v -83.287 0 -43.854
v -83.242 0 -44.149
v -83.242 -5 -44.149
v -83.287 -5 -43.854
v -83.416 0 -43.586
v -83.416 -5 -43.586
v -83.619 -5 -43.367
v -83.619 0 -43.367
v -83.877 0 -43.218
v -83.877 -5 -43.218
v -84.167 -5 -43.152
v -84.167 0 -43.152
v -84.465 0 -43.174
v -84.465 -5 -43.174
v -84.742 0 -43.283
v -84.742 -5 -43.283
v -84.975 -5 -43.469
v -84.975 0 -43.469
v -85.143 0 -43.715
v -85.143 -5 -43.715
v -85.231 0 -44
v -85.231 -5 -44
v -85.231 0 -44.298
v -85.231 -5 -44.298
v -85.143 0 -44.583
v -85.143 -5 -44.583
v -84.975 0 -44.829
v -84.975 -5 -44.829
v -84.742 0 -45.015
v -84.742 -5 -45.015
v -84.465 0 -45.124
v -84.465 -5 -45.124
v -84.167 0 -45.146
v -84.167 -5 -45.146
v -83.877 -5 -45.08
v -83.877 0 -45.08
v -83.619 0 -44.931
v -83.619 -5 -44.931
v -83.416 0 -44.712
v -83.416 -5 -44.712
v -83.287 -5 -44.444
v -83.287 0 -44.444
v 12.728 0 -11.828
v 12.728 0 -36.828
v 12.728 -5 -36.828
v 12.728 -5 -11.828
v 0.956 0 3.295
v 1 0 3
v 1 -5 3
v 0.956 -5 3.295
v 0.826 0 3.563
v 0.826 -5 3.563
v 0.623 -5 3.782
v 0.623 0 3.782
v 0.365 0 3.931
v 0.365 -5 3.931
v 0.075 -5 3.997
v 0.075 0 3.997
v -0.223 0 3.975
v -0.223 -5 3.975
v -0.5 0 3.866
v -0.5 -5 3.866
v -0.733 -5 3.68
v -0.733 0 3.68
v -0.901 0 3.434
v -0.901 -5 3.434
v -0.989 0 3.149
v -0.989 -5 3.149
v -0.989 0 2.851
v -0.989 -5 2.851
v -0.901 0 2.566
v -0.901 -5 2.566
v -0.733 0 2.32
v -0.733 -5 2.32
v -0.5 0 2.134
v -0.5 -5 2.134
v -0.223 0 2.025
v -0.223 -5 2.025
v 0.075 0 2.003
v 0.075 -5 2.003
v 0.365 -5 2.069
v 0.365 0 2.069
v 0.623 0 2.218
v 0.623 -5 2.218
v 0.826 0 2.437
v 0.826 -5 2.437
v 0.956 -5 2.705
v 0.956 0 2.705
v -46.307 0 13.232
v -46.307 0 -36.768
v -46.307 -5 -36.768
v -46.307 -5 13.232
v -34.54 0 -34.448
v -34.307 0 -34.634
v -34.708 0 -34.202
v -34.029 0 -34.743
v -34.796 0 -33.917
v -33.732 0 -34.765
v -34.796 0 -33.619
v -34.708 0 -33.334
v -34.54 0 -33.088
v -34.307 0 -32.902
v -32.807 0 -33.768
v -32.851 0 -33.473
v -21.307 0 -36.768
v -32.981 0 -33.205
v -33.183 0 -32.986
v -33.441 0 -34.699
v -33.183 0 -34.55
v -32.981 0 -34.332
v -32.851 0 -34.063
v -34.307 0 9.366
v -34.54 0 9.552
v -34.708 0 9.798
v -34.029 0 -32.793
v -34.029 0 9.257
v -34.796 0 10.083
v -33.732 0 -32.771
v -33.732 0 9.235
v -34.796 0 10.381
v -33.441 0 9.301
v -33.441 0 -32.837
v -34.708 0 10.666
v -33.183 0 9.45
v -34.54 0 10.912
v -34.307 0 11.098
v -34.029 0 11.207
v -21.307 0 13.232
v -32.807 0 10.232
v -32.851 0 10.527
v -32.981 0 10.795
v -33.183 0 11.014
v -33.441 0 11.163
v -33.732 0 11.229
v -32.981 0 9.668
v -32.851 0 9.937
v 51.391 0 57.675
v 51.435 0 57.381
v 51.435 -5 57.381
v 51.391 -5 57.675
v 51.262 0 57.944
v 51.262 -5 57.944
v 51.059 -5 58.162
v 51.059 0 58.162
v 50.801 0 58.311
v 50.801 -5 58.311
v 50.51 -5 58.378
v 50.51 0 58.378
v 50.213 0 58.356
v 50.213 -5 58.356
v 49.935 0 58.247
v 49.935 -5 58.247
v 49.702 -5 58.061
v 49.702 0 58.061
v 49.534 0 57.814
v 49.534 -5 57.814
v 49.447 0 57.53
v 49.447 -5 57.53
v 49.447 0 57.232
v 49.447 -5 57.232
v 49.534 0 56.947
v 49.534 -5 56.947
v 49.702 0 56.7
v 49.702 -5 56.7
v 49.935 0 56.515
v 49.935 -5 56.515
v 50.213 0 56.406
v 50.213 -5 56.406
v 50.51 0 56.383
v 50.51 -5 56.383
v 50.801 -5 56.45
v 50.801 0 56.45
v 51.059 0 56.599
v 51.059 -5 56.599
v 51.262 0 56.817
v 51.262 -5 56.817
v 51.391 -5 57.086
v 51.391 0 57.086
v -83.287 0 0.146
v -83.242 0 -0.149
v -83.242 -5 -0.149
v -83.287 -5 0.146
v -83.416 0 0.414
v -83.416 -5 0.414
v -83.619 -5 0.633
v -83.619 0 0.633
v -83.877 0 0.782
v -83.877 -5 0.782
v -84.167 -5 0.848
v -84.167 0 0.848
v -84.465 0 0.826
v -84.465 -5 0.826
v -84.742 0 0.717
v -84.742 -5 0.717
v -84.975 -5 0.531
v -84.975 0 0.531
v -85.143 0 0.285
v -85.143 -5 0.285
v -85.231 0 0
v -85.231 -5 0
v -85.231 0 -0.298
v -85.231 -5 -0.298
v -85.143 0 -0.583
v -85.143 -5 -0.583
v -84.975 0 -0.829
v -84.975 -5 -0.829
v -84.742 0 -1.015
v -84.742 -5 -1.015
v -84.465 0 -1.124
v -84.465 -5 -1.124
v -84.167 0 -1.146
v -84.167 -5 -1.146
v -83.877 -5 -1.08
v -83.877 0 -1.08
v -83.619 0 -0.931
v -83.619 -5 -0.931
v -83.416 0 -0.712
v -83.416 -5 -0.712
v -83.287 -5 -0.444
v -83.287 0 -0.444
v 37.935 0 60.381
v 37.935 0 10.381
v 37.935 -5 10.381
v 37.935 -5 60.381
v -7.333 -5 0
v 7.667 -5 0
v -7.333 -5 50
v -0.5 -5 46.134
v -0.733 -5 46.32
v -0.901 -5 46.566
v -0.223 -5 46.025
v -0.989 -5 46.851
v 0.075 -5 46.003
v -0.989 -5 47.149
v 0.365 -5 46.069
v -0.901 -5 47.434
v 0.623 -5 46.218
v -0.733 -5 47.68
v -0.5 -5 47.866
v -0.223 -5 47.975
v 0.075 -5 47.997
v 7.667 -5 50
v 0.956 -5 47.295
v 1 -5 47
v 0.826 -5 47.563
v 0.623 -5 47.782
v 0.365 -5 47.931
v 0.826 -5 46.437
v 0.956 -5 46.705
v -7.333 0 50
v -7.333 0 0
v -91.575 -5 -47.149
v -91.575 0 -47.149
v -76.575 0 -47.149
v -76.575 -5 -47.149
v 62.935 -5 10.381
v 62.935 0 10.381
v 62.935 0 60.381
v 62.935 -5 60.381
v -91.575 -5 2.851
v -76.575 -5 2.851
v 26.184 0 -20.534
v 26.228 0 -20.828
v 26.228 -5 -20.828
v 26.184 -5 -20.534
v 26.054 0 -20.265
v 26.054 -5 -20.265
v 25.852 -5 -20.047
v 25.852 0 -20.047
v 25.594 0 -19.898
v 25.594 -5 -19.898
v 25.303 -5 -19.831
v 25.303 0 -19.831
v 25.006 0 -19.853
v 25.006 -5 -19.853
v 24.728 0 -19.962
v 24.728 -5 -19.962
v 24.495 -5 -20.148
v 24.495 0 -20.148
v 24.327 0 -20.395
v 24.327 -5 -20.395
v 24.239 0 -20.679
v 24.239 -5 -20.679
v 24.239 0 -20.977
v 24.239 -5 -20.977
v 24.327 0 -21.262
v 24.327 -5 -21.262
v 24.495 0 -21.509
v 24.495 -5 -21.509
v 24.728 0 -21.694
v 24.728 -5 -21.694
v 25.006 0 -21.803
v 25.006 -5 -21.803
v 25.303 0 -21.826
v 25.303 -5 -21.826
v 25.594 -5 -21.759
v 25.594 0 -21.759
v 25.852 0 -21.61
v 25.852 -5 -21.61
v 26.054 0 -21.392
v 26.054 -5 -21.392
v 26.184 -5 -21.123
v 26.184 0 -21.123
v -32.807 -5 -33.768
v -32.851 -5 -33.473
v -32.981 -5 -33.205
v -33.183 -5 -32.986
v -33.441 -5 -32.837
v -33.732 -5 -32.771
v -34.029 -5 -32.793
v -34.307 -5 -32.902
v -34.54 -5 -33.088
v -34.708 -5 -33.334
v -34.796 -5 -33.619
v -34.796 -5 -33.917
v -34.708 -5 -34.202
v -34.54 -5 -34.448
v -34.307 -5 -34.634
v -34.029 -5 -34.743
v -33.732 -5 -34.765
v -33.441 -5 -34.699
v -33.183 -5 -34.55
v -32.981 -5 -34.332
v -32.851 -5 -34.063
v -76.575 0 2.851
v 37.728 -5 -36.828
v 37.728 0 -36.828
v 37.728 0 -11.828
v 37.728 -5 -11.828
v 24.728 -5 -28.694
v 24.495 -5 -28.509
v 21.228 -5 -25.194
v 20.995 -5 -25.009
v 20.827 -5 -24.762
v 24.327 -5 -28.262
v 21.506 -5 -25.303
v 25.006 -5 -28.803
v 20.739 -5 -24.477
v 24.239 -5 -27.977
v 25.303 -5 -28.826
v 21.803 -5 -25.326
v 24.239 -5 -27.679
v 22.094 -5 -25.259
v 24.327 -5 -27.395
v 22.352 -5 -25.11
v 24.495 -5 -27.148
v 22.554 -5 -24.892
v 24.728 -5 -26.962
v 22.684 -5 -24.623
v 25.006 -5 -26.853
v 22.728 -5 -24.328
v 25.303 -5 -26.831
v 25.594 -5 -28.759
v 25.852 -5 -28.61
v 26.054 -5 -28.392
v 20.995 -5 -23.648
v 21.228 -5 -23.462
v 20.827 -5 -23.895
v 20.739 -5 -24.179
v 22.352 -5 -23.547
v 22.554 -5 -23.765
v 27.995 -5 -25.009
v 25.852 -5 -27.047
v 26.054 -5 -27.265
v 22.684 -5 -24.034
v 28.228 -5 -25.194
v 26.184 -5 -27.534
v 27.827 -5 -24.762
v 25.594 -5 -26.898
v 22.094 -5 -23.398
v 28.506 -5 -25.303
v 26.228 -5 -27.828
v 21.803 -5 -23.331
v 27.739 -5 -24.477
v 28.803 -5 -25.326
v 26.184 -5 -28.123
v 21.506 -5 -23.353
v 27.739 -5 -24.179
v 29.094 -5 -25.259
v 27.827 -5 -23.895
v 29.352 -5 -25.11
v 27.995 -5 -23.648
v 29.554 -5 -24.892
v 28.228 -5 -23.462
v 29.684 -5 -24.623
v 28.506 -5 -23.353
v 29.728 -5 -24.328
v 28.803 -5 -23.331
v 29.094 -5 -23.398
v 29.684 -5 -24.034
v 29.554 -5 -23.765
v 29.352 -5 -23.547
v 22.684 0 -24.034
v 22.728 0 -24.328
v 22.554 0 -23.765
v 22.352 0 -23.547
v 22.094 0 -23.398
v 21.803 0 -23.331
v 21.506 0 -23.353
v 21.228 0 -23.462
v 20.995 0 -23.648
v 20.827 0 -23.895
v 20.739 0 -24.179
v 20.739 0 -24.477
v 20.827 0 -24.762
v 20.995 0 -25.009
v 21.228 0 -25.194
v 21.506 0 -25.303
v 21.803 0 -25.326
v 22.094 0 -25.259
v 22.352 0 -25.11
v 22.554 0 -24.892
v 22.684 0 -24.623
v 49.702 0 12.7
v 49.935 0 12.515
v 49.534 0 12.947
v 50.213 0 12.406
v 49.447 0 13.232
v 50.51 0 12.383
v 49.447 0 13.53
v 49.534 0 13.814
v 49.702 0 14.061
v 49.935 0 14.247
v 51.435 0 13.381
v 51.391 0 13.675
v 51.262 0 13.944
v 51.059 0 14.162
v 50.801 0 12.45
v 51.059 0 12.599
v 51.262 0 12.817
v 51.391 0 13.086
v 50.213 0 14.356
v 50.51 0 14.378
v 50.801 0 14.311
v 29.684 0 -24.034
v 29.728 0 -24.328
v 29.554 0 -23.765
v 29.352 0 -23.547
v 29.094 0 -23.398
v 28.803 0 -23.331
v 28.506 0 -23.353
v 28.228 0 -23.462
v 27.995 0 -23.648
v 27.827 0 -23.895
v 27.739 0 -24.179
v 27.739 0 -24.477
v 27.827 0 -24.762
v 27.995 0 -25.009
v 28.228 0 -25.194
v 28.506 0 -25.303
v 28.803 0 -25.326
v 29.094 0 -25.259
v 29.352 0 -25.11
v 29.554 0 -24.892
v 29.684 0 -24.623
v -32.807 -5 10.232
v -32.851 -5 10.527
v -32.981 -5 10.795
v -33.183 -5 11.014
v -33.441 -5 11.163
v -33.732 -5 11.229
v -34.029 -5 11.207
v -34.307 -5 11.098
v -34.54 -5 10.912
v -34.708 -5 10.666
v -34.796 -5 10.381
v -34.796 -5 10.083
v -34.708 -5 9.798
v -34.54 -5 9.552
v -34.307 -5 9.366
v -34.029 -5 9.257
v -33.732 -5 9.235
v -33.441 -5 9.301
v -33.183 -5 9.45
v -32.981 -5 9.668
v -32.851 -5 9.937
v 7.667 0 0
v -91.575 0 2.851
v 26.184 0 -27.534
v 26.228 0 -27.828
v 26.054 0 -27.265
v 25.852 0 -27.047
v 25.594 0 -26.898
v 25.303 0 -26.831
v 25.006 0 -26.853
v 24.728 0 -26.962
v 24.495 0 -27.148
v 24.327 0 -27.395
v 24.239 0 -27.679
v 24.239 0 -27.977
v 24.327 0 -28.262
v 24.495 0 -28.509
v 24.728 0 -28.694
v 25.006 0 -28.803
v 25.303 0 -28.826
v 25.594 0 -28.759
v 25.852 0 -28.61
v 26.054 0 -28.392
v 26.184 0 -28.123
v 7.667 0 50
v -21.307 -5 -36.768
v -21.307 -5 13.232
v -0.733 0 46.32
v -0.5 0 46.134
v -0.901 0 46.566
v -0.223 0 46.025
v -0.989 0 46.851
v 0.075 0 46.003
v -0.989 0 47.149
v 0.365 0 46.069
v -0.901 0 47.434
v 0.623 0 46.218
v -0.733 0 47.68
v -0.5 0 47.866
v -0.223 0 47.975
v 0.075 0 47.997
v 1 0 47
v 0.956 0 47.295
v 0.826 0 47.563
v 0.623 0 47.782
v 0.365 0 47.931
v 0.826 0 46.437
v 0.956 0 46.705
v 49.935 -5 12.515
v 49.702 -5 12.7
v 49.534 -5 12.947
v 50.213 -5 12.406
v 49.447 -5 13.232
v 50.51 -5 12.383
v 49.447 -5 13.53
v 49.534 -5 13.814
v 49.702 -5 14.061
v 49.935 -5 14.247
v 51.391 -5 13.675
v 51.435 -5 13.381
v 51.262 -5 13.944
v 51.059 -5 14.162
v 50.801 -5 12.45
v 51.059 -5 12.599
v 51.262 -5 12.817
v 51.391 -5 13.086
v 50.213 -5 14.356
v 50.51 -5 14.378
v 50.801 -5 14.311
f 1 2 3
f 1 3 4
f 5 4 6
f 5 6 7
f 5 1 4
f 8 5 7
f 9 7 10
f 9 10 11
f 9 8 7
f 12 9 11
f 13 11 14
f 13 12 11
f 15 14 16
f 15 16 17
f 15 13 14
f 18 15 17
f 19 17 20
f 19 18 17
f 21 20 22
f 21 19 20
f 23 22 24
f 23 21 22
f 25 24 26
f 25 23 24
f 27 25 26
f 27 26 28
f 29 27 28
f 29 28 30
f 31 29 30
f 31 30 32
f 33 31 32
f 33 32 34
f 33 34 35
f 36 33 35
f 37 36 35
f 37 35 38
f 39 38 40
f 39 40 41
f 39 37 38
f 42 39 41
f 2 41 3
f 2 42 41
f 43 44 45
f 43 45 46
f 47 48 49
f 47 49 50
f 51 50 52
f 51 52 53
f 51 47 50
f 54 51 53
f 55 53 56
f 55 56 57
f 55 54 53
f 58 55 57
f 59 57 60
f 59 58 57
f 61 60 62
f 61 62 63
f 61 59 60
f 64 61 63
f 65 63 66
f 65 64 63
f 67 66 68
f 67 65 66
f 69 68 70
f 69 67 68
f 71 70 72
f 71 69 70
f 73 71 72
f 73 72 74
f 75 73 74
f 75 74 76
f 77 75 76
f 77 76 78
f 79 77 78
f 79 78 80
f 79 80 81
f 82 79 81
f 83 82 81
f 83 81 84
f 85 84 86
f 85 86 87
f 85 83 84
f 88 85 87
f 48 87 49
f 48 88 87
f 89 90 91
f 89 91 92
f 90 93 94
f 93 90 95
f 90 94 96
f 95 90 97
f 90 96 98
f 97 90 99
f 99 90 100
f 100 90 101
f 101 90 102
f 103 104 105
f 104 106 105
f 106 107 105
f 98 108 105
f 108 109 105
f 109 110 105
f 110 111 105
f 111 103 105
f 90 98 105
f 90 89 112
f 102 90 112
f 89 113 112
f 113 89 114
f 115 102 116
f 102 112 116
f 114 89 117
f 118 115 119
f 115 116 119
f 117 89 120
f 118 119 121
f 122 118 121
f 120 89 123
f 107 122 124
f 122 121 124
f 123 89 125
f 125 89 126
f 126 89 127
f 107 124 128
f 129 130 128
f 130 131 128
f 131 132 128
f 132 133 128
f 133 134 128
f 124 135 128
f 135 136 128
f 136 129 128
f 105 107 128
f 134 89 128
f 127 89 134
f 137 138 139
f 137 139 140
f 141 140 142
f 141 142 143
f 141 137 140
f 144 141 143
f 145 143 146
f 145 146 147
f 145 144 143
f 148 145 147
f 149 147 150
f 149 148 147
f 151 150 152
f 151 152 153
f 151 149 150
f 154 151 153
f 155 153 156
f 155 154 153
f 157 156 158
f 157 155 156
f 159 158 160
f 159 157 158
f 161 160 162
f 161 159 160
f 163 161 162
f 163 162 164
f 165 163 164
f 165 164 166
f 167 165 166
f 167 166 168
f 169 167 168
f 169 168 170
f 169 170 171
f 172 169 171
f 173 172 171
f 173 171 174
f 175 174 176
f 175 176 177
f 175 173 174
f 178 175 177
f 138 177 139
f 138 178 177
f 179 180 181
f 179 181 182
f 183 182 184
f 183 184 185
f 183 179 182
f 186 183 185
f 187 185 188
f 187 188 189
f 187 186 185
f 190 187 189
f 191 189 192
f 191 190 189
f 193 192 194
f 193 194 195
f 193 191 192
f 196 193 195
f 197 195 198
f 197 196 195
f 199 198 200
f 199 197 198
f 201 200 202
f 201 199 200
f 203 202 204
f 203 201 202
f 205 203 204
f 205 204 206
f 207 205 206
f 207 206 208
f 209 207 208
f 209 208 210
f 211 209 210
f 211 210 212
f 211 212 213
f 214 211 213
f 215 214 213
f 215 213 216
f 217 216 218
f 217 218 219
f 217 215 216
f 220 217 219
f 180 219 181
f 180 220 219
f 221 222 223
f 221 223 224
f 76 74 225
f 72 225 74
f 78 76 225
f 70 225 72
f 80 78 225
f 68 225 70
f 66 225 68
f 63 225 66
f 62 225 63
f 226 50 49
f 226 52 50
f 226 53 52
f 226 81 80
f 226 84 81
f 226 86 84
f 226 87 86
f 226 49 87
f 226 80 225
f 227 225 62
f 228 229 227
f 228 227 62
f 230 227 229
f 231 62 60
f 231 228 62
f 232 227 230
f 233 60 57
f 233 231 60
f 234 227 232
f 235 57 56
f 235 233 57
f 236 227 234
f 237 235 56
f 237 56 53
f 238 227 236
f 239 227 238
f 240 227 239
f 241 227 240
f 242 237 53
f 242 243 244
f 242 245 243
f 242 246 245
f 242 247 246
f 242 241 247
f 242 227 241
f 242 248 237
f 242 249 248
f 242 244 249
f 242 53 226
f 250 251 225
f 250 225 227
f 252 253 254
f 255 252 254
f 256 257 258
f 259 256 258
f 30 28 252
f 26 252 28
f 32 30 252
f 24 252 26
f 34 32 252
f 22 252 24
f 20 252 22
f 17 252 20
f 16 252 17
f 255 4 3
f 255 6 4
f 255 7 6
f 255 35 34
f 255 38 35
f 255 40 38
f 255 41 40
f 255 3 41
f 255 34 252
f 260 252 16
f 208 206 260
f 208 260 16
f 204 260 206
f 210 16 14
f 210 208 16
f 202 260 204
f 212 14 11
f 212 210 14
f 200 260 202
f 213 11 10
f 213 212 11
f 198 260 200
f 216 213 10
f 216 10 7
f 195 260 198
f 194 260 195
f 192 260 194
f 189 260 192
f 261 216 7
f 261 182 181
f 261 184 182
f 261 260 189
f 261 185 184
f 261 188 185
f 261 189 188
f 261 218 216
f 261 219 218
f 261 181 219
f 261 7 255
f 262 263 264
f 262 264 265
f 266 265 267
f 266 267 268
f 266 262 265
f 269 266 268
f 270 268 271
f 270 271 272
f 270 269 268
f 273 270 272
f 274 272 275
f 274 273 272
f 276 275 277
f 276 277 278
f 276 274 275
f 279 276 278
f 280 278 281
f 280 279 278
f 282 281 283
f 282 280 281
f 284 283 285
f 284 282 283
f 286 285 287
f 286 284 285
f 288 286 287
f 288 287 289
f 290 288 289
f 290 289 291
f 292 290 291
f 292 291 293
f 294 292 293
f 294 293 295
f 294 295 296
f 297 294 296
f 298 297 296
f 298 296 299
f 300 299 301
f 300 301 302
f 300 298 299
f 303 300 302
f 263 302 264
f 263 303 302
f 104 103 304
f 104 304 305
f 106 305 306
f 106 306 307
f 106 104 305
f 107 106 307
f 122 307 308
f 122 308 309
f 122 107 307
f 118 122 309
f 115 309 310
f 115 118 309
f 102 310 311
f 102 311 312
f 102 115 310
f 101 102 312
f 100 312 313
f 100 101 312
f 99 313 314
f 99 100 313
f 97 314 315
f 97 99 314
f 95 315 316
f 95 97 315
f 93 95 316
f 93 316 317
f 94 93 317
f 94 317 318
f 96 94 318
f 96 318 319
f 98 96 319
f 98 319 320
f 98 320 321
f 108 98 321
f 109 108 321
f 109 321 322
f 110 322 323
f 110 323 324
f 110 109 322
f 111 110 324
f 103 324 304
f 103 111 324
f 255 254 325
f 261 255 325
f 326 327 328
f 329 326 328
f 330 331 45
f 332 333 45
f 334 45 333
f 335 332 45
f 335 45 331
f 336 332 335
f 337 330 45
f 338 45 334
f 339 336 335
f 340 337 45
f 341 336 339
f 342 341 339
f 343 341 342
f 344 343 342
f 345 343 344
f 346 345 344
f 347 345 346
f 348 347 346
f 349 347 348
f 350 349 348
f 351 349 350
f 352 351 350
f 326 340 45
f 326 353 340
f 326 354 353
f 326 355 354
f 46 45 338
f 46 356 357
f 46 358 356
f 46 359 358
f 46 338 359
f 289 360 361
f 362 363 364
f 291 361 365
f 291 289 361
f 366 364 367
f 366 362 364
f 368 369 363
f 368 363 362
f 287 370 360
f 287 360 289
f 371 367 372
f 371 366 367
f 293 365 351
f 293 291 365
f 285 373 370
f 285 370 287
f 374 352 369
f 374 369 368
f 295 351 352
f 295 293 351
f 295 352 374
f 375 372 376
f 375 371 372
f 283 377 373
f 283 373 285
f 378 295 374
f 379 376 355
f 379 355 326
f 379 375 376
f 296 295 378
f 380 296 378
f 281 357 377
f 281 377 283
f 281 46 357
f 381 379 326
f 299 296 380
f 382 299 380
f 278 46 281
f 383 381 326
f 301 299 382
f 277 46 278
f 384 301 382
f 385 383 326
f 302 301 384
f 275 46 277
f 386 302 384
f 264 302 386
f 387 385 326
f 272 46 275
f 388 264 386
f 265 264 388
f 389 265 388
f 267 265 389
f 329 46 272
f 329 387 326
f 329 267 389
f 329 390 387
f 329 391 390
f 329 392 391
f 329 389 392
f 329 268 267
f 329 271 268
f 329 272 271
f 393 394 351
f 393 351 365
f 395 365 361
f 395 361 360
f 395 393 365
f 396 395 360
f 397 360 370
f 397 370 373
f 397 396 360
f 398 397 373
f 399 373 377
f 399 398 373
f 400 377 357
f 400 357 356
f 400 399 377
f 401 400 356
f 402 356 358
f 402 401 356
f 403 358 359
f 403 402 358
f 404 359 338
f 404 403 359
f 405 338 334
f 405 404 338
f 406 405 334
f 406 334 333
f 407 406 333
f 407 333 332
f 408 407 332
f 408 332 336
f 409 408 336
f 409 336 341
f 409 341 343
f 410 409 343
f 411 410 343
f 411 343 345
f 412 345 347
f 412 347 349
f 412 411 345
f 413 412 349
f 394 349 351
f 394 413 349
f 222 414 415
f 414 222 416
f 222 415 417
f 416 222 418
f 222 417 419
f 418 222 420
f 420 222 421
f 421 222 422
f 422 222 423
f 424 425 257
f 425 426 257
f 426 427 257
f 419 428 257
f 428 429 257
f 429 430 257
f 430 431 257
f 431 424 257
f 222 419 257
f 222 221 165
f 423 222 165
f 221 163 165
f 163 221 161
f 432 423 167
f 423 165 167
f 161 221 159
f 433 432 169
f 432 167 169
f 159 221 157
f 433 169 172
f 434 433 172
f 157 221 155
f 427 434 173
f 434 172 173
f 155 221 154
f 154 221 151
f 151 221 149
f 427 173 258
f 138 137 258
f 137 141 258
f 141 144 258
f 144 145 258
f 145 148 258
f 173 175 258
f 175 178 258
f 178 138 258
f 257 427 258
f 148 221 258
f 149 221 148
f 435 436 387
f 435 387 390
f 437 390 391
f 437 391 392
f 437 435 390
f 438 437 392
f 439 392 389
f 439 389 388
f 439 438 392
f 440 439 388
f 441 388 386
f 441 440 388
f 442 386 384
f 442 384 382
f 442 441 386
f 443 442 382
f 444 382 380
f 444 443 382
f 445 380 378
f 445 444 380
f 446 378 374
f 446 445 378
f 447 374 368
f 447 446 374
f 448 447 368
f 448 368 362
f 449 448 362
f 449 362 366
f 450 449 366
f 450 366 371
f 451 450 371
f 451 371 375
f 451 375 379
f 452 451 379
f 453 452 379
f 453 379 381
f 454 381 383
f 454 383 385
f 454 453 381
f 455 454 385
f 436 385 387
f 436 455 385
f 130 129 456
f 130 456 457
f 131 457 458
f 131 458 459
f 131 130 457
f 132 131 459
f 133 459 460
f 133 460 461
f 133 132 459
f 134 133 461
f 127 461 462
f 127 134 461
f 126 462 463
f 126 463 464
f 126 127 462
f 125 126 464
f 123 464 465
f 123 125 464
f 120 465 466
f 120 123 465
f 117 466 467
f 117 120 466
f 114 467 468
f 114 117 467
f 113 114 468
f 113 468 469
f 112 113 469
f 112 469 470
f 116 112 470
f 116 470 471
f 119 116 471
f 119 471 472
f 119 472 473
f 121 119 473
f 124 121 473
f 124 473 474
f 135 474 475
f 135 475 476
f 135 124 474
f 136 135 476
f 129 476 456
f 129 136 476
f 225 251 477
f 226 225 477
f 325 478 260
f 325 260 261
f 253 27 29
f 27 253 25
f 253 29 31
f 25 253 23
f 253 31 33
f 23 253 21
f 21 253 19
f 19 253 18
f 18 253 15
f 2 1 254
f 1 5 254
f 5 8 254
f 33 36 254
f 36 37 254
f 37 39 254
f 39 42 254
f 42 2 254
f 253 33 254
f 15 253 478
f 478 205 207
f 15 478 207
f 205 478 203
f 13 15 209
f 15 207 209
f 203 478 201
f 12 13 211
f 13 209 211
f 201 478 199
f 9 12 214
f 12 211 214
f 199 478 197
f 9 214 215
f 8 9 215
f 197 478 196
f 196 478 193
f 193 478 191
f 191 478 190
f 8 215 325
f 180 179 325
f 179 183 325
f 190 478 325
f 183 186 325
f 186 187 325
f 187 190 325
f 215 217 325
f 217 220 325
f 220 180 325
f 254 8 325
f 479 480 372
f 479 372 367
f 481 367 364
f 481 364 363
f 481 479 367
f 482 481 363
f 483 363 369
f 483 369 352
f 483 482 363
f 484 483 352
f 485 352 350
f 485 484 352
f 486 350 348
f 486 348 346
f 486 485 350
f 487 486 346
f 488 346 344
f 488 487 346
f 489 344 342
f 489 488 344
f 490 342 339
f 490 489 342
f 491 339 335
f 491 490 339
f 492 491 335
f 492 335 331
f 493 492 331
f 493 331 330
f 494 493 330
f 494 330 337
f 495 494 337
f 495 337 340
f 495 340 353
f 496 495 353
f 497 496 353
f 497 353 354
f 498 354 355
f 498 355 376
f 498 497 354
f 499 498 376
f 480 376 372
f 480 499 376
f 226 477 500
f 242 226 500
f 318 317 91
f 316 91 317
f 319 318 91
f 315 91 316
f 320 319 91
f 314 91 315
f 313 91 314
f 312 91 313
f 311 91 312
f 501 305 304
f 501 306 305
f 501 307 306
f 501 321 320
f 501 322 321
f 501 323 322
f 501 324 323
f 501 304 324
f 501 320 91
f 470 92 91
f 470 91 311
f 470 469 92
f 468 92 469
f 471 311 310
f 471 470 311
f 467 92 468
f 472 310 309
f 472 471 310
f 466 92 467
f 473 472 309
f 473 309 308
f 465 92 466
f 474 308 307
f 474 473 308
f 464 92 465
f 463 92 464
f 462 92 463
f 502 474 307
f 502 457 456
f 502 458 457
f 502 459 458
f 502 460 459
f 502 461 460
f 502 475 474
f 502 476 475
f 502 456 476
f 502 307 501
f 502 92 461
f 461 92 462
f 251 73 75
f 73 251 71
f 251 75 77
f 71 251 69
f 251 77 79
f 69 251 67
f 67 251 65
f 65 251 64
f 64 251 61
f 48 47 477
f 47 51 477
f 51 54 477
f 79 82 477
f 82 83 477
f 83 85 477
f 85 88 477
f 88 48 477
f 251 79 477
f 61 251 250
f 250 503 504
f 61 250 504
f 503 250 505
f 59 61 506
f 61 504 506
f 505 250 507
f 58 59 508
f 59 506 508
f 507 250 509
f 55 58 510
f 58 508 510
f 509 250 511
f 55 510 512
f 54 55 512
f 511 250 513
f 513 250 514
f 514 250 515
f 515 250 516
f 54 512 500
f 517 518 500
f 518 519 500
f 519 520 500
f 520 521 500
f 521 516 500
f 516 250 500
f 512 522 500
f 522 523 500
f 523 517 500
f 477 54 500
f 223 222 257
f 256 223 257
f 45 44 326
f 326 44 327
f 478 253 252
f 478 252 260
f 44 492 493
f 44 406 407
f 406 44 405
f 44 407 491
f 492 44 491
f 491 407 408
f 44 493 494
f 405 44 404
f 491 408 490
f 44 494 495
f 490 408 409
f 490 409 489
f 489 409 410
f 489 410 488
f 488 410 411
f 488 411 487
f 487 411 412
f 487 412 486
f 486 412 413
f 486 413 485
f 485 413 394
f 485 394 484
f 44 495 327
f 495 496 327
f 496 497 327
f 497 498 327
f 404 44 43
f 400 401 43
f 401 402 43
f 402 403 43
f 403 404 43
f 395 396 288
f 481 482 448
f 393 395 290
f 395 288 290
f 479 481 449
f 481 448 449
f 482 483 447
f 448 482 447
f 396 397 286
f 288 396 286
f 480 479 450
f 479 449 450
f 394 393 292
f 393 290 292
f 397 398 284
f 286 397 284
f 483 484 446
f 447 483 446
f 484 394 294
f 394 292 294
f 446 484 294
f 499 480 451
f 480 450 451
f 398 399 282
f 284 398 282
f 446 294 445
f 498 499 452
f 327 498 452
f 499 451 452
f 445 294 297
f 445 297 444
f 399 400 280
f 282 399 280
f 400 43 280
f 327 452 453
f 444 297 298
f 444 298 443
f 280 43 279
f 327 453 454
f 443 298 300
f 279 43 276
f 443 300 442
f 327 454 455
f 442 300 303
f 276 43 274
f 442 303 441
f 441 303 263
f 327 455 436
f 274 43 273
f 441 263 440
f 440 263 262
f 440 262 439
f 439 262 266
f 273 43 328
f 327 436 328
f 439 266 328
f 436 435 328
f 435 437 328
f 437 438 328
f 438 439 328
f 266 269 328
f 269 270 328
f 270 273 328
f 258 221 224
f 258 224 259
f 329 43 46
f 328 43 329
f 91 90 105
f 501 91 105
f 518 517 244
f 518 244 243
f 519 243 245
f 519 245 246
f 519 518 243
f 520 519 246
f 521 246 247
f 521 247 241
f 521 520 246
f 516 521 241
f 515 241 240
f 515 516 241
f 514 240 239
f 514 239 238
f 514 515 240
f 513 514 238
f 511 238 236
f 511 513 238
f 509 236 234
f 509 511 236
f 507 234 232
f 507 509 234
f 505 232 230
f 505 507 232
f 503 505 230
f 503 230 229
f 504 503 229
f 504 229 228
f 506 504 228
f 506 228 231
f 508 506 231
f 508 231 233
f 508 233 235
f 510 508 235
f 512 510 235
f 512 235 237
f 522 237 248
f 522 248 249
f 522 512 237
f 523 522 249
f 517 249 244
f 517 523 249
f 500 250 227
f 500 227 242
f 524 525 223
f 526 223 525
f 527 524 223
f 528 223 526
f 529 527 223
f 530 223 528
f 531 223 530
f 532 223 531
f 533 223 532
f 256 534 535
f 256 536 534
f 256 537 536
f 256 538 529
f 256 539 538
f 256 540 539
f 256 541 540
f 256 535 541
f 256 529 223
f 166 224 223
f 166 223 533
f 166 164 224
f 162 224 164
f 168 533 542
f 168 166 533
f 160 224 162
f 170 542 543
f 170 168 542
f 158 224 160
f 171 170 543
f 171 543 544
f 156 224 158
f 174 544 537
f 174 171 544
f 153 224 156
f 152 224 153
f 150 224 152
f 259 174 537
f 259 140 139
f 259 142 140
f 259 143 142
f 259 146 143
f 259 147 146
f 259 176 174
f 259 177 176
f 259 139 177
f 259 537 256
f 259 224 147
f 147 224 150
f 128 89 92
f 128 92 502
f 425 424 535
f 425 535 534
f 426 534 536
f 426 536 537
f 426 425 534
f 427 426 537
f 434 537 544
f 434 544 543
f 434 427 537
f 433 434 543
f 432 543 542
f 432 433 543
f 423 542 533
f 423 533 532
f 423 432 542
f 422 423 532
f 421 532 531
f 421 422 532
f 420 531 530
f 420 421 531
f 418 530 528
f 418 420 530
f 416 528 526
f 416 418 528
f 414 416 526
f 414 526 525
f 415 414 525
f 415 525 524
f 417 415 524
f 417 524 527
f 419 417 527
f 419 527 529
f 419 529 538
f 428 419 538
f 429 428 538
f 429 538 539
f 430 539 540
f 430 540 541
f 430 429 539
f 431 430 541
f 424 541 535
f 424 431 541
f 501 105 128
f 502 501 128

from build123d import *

# Parameters (mm, degrees)
F0_W     = 15
F0_H     = 50
F0_R     = 1
F1_DEPTH = 5
F2_DEPTH = 5
F0_W_2   = 25
F0_H_2   = 25


# Not quite as in the source:
# - a feature names something its author has since deleted; it is built from what else it names


with BuildPart() as f1:
    # F0 (on Front) → F1 (new body)
    with BuildSketch(Plane.XZ):
        with Locations((0.1666661408, 25)):
            Rectangle(F0_W, F0_H)
        with Locations((0, 3)):
            Circle(F0_R, mode=Mode.SUBTRACT)
        with Locations((0, 47)):
            Circle(F0_R, mode=Mode.SUBTRACT)
    extrude(amount=F1_DEPTH)

    # F0 (on Front) → F2 (join)
    with BuildSketch(Plane.XZ):
        with Locations((0.1666661408, 25)):
            Rectangle(F0_W, F0_H)
        with Locations((0, 3)):
            Circle(F0_R, mode=Mode.SUBTRACT)
        with Locations((0, 47)):
            Circle(F0_R, mode=Mode.SUBTRACT)
    extrude(amount=F2_DEPTH)


with BuildPart() as f2:
    # F0 (on Front) → F2, piece 2 (new body)
    with BuildSketch(Plane.XZ):
        with Locations((50.4353579649, 35.3805905879)):
            Rectangle(F0_W_2, F0_H)
        with Locations((50.4353579649, 13.3805905879)):
            Circle(F0_R, mode=Mode.SUBTRACT)
        with Locations((50.4353579649, 57.3805905879)):
            Circle(F0_R, mode=Mode.SUBTRACT)
    extrude(amount=F2_DEPTH)


with BuildPart() as f2b:
    # F0 (on Front) → F2, piece 3 (new body)
    with BuildSketch(Plane.XZ):
        with Locations((-84.0754437791, -22.1488411874)):
            Rectangle(F0_W, F0_H)
        with Locations((-84.2421099199, -44.1488411874)):
            Circle(F0_R, mode=Mode.SUBTRACT)
        with Locations((-84.2421099199, -0.1488411874)):
            Circle(F0_R, mode=Mode.SUBTRACT)
    extrude(amount=F2_DEPTH)


with BuildPart() as f2c:
    # F0 (on Front) → F2, piece 4 (new body)
    with BuildSketch(Plane.XZ):
        with Locations((-33.806751955, -11.7682505995)):
            Rectangle(F0_W_2, F0_H)
        with Locations((-33.806751955, -33.7682505995)):
            Circle(F0_R, mode=Mode.SUBTRACT)
        with Locations((-33.806751955, 10.2317494005)):
            Circle(F0_R, mode=Mode.SUBTRACT)
    extrude(amount=F2_DEPTH)


with BuildPart() as f2d:
    # F0 (on Front) → F2, piece 5 (new body)
    with BuildSketch(Plane.XZ):
        with Locations((25.2282431349, -24.3284247816)):
            Rectangle(F0_W_2, F0_H_2)
        with Locations((21.7282431349, -24.3284247816)):
            Circle(F0_R, mode=Mode.SUBTRACT)
        with Locations((25.2282431349, -27.8284247816)):
            Circle(F0_R, mode=Mode.SUBTRACT)
        with Locations((28.7282431349, -24.3284247816)):
            Circle(F0_R, mode=Mode.SUBTRACT)
        with Locations((25.2282431349, -20.8284247816)):
            Circle(F0_R, mode=Mode.SUBTRACT)
    extrude(amount=F2_DEPTH)


solid = Compound([f1.part, f2.part, f2b.part, f2c.part, f2d.part])
